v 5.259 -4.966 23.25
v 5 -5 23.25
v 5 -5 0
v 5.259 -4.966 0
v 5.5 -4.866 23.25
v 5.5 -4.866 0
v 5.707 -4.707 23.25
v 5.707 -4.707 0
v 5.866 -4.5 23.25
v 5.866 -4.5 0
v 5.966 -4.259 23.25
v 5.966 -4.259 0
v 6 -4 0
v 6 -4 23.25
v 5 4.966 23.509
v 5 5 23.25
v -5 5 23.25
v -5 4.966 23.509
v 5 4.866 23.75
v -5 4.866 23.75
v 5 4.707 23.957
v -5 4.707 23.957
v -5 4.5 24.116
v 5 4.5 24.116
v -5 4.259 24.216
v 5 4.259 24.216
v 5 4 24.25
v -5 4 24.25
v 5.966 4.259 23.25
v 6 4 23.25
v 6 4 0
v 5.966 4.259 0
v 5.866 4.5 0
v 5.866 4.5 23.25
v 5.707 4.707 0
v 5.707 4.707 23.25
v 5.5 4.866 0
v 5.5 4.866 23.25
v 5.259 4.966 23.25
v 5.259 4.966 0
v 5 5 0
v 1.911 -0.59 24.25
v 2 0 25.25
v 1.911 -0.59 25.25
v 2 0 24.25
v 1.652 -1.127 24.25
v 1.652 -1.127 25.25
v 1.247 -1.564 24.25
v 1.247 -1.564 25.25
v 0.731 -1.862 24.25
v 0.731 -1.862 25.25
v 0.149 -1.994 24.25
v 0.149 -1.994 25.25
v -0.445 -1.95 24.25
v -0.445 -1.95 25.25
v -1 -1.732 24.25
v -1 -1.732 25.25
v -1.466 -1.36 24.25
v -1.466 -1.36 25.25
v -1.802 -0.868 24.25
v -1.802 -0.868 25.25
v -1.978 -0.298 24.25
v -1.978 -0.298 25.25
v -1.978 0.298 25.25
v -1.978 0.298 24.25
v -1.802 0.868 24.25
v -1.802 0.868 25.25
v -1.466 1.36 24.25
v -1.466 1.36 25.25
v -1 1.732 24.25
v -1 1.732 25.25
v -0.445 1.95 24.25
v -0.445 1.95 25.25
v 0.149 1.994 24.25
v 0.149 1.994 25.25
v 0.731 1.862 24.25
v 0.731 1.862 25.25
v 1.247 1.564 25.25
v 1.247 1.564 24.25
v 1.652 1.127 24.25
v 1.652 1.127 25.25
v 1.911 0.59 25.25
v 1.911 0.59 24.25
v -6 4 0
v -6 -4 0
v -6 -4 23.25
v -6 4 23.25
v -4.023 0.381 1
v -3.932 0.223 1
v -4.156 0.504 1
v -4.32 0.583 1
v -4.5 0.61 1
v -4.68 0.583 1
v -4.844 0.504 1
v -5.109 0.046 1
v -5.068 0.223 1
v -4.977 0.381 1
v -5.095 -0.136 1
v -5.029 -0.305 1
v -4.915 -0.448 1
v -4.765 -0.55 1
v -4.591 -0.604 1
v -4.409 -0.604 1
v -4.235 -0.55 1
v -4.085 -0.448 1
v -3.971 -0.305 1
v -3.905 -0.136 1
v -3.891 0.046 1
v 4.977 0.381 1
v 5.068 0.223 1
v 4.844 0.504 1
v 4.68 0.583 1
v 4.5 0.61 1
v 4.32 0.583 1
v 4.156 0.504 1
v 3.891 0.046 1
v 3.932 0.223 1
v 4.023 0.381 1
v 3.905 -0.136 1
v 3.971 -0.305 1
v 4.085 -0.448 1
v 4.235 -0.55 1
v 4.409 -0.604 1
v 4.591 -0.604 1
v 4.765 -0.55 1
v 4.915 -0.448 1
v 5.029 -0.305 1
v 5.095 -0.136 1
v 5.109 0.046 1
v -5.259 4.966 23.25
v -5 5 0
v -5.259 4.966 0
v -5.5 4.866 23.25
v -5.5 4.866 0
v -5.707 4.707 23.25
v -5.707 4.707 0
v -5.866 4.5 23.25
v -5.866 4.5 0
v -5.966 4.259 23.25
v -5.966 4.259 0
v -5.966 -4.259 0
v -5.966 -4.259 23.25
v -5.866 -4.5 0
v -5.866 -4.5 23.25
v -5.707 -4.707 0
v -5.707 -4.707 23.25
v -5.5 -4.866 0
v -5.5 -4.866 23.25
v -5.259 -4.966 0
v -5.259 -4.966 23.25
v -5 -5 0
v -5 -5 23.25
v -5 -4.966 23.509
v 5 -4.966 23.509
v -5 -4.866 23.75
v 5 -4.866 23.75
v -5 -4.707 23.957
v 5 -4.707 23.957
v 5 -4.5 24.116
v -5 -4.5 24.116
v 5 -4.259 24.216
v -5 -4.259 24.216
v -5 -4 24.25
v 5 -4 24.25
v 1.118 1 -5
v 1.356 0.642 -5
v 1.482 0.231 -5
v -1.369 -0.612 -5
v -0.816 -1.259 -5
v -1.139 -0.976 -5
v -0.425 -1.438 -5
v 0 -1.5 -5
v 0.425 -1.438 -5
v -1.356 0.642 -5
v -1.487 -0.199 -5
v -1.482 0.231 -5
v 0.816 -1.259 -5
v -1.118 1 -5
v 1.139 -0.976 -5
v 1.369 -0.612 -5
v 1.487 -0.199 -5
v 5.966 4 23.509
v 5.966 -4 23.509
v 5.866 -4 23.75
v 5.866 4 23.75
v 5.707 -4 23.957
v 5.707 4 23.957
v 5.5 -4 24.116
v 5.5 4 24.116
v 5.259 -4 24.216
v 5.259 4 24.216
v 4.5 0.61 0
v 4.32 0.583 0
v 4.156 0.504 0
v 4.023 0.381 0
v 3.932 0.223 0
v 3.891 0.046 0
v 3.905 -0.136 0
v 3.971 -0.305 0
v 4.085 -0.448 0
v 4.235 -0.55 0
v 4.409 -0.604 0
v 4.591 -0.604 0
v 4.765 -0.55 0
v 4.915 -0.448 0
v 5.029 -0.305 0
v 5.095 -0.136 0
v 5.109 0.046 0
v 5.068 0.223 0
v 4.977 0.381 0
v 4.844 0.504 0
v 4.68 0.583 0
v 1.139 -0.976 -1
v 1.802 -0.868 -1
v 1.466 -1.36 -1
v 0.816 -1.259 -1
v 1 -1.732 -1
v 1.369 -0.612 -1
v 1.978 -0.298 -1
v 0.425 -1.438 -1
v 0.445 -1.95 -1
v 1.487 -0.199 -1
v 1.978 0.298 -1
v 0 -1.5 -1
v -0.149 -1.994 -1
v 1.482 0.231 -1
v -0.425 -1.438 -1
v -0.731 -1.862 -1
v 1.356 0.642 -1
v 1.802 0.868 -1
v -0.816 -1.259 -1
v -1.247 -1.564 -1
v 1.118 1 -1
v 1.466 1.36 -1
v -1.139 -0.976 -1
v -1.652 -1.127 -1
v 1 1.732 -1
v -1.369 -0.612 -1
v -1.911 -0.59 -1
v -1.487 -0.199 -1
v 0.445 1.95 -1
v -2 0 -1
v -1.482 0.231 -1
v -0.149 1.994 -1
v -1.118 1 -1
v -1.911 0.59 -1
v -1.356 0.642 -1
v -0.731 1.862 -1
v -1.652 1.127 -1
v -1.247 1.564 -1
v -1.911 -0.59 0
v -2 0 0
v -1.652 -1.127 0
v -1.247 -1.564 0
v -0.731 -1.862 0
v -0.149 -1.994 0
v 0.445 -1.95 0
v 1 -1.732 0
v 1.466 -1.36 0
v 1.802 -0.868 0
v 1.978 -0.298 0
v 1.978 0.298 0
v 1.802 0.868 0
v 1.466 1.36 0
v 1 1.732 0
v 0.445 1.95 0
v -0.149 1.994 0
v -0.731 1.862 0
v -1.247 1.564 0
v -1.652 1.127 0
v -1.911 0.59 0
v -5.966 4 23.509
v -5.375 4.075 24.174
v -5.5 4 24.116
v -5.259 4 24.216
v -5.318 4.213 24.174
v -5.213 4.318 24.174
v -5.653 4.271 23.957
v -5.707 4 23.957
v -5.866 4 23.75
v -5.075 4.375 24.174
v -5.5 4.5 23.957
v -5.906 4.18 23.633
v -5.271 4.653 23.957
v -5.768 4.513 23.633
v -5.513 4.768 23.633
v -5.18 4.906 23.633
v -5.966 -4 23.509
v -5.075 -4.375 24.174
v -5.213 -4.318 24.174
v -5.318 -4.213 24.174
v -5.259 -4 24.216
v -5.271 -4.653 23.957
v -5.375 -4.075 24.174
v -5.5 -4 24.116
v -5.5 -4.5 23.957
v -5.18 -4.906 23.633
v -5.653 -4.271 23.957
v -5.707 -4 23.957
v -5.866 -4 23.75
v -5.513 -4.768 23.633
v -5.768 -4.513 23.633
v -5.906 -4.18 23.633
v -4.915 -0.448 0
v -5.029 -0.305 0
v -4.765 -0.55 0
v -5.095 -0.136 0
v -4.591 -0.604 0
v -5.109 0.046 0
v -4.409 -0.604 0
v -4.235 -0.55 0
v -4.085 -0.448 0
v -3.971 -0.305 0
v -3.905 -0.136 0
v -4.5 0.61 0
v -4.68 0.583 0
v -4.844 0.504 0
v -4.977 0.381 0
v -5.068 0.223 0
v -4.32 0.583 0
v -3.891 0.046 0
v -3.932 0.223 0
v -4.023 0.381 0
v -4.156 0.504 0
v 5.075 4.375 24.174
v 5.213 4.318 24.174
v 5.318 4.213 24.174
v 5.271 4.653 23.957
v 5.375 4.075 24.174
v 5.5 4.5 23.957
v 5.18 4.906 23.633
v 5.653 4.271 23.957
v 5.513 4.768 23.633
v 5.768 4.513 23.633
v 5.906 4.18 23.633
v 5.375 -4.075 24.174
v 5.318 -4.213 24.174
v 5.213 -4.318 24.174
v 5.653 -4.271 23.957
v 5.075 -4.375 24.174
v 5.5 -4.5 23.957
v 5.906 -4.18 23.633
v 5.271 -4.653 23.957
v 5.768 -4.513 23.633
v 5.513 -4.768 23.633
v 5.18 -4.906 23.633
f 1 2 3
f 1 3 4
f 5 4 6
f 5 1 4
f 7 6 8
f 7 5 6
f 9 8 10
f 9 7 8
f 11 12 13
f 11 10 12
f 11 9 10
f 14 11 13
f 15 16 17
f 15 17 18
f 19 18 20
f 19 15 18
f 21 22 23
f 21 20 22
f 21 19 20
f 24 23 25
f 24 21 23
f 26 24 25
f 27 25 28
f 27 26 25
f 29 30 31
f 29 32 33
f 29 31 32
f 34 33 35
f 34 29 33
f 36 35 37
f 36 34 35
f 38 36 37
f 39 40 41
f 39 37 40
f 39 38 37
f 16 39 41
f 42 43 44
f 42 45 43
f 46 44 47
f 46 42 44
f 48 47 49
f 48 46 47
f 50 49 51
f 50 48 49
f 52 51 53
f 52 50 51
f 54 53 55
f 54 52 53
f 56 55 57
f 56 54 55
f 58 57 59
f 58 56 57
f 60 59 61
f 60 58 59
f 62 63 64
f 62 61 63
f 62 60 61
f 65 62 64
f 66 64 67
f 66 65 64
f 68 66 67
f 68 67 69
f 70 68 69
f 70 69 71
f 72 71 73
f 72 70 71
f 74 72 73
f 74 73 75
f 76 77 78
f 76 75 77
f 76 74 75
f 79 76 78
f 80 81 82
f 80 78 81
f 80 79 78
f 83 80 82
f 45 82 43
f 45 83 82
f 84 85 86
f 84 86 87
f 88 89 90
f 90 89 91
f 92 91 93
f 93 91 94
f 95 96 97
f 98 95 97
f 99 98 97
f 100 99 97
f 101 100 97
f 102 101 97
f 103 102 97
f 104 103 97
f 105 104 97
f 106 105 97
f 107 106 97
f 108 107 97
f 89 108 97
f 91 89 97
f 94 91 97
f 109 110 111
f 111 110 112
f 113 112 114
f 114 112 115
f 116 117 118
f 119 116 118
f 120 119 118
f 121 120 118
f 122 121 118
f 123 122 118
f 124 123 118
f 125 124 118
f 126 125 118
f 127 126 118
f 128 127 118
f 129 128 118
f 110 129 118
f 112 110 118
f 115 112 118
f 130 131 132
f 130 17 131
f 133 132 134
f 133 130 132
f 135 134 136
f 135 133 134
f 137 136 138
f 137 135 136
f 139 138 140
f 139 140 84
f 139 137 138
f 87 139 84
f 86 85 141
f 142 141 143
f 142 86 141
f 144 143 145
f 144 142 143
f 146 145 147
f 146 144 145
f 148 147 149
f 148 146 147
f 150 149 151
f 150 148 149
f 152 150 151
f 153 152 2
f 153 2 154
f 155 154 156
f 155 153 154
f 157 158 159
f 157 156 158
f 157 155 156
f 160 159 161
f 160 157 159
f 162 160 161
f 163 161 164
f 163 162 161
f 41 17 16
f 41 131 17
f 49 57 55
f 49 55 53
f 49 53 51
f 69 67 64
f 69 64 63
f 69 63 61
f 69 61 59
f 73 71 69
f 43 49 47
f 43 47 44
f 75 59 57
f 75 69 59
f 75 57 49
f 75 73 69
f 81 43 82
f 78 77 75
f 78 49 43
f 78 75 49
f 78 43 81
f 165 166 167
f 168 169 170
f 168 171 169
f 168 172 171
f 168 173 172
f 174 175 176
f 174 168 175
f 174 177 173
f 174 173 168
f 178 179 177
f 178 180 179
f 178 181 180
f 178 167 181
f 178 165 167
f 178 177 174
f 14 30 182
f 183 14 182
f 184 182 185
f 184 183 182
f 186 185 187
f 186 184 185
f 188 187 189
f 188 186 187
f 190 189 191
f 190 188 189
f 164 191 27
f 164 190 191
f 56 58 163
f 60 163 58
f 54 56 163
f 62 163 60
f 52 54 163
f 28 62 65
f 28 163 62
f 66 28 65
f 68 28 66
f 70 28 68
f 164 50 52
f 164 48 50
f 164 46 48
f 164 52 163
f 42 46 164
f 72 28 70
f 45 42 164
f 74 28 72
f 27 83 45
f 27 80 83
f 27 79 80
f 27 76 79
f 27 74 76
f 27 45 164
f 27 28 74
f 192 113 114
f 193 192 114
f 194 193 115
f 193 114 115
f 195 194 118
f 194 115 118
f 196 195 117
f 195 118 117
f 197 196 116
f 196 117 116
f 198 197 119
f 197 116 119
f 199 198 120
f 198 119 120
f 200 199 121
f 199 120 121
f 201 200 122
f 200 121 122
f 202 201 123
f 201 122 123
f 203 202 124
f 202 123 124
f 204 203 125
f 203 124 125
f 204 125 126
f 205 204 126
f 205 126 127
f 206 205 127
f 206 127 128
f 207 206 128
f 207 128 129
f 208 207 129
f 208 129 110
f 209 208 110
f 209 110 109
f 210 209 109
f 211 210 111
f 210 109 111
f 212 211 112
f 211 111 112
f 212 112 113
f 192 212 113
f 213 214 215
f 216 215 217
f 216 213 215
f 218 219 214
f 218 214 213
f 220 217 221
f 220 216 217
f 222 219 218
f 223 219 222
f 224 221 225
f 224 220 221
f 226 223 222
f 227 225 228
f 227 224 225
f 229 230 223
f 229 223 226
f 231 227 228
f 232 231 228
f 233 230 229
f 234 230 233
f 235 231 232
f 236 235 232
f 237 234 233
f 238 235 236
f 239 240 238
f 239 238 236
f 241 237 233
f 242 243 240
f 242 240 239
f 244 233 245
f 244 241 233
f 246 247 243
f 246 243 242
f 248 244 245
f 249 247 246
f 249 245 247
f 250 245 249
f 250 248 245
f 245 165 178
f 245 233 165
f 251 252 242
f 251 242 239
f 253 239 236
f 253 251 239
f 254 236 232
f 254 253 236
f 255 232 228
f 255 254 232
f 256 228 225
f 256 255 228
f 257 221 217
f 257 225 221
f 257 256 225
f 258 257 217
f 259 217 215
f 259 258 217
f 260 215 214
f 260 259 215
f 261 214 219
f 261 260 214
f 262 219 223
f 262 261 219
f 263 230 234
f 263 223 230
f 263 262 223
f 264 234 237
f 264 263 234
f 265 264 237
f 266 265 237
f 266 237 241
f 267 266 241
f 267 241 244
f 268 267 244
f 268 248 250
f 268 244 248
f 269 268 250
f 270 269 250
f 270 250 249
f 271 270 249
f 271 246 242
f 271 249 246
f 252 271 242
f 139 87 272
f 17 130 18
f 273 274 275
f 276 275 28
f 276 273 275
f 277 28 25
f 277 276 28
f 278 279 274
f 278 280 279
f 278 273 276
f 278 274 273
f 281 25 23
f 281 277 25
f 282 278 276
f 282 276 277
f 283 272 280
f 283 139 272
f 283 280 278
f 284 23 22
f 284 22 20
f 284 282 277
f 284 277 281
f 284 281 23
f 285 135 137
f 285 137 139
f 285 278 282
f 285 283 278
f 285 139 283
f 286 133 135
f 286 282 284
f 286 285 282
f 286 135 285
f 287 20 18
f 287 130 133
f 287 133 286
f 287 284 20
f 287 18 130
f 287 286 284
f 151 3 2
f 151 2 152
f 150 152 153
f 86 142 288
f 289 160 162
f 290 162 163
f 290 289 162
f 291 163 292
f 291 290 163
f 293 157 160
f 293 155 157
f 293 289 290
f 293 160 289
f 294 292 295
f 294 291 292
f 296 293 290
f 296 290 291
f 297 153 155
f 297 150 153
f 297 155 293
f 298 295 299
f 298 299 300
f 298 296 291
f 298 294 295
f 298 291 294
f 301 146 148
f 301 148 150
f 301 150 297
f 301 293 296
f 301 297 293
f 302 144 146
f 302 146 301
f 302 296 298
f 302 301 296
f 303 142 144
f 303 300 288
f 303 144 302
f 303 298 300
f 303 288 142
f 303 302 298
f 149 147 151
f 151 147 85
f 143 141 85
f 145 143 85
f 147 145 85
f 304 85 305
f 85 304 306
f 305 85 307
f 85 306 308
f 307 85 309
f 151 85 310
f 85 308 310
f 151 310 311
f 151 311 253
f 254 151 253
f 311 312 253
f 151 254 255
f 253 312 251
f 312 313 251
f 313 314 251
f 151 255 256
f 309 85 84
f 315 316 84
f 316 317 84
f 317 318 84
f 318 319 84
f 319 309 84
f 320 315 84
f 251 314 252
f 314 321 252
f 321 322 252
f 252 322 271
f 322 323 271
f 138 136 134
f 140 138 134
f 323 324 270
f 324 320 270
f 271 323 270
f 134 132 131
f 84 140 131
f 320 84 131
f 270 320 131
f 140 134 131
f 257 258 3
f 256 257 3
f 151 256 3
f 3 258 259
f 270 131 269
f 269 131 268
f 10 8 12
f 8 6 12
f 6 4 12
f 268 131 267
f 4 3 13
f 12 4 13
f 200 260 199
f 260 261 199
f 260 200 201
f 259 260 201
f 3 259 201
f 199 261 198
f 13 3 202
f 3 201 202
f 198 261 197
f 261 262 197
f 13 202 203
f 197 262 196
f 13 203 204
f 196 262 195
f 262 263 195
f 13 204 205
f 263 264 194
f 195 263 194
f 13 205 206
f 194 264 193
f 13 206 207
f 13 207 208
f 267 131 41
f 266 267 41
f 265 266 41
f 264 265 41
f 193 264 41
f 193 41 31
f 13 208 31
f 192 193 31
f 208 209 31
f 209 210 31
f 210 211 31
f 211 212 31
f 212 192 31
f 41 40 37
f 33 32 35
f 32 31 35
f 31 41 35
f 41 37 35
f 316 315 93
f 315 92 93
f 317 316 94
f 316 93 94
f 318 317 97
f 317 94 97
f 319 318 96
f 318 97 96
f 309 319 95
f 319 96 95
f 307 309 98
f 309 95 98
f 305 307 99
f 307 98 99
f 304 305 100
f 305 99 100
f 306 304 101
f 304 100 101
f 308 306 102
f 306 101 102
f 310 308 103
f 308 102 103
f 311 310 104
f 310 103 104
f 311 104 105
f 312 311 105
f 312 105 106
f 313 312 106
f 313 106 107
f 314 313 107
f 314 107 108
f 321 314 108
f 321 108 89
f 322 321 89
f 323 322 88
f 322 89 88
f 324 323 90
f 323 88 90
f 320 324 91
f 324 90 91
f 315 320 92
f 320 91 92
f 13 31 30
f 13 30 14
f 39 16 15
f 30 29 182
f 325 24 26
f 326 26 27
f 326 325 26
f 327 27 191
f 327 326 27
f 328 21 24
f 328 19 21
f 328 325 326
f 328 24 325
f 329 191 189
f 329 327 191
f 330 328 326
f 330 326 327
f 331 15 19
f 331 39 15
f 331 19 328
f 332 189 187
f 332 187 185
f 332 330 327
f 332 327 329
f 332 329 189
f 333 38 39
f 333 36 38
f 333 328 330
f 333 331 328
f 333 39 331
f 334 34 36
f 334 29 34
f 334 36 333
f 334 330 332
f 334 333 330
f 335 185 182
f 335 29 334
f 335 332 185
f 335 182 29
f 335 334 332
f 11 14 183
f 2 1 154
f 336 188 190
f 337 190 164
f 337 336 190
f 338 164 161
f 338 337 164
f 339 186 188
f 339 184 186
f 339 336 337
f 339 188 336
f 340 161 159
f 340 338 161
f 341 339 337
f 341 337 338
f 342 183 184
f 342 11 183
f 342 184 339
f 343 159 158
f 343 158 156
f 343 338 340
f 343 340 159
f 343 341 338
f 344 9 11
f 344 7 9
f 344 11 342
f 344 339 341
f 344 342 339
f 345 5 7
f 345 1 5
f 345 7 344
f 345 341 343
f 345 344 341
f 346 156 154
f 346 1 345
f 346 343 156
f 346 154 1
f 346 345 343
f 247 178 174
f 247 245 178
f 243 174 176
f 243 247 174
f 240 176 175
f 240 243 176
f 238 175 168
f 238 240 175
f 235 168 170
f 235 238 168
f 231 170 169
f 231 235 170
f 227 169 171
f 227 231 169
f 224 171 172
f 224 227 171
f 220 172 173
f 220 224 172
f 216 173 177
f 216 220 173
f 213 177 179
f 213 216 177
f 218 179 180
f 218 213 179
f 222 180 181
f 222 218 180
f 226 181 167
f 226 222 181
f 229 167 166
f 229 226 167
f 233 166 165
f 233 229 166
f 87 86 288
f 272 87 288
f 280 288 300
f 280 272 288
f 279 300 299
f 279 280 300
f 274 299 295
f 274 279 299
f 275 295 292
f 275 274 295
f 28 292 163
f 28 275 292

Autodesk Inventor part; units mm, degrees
ref_plane "YZ Plane" through (0, 0, 0) normal (1, 0, 0) x (0, 1, 0)
ref_plane "XZ Plane" through (0, 0, 0) normal (0, 1, 0) x (-1, 0, 0)
ref_plane "XY Plane" through (0, 0, 0) normal (0, 0, 1) x (1, 0, 0)
sketch "Sketch1" plane through (0, 0, 0) normal (0, 0, 1) x (1, 0, 0)
  line L0 (-6, 5) -> (6, 5)
  line L1 (6, 5) -> (6, -5)
  line L2 (6, -5) -> (-6, -5)
  line L3 (-6, -5) -> (-6, 5)
  line L4 (-6, 5) -> (6, -5) construction
  line L5 (6, 5) -> (-6, -5) construction
  point P0 (0, 0)
  dimension "d0" = 12
  dimension "d1" = 10
extrude "Extrusion1" add sketch "Sketch1" along normal blind 24.25
sketch "Sketch2" plane through (0, 0, 24.25) normal (0, 0, 1) x (1, 0, 0)
  circle A0 centre (0, 0) radius 2
  dimension "d4" = 4
extrude "Extrusion2" add sketch "Sketch2" along normal blind 1
sketch "Sketch3" plane through (0, 0, 0) normal (0, 0, -1) x (-1, 0, 0)
  circle A0 centre (0, 0) radius 2
  dimension "d7" = 4
extrude "Extrusion3" add sketch "Sketch3" along normal blind 1
sketch "Sketch4" plane through (0, 0, -1) normal (0, 0, -1) x (-1, 0, 0)
  circle A0 centre (0, 0) radius 1.5
  line L0 (-1.5, 1) -> (1.5, 1)
  line L1 (1.5, 1) -> (1.5, -1.5)
  line L2 (1.5, -1.5) -> (-1.5, -1.5)
  line L3 (-1.5, -1.5) -> (-1.5, 1)
  point P0 (1.118, 1)
  point P1 (-1.118, 1)
  dimension "d10" = 3
  dimension "d11" = 2.5
extrude "Extrusion4" add sketch "Sketch4" along normal blind 4 contours A0 L0 picked at (-0.0419, 0.0796)
fillet "Fillet1" radius 1 8 edges at (6, 5, 12.125) (-6, 5, 12.125) (6, -5, 12.125) (-6, -5, 12.125) (0, 5, 24.25) (6, 0, 24.25) (-6, 0, 24.25) (0, -5, 24.25)
sketch "Sketch5" plane through (0, 0, 0) normal (0, 0, -1) x (-1, 0, 0)
  arc A0 (5, -5) -> (6, -4) centre (5, -4) ccw projected
  line L0 (6, 4) -> (6, -4) projected
  arc A1 (6, 4) -> (5, 5) centre (5, 4) ccw projected
  line L1 (-5, 5) -> (5, 5) projected
  arc A2 (-5, 5) -> (-6, 4) centre (-5, 4) ccw projected
  line L2 (-6, -4) -> (-6, 4) projected
  arc A3 (-6, -4) -> (-5, -5) centre (-5, -4) ccw projected
  line L3 (5, -5) -> (-5, -5) projected
  circle A4 centre (0, 0) radius 2 projected
  point P0 (-4.5, 0)
  point P1 (4.5, 0)
  dimension "d15" = 4.5
  dimension "d16" = 4.5
hole "Hole1" at (4.5, 0, 0) at (-4.5, 0, 0) direction (0, 0, 1) diameter 1.221 depth 1 thread size "M1.6x0.35" class "6H" standard "ISO Metric profile"
equation "\"d16\" = d15"
properties part number "1800rpm Brushed Motor"
